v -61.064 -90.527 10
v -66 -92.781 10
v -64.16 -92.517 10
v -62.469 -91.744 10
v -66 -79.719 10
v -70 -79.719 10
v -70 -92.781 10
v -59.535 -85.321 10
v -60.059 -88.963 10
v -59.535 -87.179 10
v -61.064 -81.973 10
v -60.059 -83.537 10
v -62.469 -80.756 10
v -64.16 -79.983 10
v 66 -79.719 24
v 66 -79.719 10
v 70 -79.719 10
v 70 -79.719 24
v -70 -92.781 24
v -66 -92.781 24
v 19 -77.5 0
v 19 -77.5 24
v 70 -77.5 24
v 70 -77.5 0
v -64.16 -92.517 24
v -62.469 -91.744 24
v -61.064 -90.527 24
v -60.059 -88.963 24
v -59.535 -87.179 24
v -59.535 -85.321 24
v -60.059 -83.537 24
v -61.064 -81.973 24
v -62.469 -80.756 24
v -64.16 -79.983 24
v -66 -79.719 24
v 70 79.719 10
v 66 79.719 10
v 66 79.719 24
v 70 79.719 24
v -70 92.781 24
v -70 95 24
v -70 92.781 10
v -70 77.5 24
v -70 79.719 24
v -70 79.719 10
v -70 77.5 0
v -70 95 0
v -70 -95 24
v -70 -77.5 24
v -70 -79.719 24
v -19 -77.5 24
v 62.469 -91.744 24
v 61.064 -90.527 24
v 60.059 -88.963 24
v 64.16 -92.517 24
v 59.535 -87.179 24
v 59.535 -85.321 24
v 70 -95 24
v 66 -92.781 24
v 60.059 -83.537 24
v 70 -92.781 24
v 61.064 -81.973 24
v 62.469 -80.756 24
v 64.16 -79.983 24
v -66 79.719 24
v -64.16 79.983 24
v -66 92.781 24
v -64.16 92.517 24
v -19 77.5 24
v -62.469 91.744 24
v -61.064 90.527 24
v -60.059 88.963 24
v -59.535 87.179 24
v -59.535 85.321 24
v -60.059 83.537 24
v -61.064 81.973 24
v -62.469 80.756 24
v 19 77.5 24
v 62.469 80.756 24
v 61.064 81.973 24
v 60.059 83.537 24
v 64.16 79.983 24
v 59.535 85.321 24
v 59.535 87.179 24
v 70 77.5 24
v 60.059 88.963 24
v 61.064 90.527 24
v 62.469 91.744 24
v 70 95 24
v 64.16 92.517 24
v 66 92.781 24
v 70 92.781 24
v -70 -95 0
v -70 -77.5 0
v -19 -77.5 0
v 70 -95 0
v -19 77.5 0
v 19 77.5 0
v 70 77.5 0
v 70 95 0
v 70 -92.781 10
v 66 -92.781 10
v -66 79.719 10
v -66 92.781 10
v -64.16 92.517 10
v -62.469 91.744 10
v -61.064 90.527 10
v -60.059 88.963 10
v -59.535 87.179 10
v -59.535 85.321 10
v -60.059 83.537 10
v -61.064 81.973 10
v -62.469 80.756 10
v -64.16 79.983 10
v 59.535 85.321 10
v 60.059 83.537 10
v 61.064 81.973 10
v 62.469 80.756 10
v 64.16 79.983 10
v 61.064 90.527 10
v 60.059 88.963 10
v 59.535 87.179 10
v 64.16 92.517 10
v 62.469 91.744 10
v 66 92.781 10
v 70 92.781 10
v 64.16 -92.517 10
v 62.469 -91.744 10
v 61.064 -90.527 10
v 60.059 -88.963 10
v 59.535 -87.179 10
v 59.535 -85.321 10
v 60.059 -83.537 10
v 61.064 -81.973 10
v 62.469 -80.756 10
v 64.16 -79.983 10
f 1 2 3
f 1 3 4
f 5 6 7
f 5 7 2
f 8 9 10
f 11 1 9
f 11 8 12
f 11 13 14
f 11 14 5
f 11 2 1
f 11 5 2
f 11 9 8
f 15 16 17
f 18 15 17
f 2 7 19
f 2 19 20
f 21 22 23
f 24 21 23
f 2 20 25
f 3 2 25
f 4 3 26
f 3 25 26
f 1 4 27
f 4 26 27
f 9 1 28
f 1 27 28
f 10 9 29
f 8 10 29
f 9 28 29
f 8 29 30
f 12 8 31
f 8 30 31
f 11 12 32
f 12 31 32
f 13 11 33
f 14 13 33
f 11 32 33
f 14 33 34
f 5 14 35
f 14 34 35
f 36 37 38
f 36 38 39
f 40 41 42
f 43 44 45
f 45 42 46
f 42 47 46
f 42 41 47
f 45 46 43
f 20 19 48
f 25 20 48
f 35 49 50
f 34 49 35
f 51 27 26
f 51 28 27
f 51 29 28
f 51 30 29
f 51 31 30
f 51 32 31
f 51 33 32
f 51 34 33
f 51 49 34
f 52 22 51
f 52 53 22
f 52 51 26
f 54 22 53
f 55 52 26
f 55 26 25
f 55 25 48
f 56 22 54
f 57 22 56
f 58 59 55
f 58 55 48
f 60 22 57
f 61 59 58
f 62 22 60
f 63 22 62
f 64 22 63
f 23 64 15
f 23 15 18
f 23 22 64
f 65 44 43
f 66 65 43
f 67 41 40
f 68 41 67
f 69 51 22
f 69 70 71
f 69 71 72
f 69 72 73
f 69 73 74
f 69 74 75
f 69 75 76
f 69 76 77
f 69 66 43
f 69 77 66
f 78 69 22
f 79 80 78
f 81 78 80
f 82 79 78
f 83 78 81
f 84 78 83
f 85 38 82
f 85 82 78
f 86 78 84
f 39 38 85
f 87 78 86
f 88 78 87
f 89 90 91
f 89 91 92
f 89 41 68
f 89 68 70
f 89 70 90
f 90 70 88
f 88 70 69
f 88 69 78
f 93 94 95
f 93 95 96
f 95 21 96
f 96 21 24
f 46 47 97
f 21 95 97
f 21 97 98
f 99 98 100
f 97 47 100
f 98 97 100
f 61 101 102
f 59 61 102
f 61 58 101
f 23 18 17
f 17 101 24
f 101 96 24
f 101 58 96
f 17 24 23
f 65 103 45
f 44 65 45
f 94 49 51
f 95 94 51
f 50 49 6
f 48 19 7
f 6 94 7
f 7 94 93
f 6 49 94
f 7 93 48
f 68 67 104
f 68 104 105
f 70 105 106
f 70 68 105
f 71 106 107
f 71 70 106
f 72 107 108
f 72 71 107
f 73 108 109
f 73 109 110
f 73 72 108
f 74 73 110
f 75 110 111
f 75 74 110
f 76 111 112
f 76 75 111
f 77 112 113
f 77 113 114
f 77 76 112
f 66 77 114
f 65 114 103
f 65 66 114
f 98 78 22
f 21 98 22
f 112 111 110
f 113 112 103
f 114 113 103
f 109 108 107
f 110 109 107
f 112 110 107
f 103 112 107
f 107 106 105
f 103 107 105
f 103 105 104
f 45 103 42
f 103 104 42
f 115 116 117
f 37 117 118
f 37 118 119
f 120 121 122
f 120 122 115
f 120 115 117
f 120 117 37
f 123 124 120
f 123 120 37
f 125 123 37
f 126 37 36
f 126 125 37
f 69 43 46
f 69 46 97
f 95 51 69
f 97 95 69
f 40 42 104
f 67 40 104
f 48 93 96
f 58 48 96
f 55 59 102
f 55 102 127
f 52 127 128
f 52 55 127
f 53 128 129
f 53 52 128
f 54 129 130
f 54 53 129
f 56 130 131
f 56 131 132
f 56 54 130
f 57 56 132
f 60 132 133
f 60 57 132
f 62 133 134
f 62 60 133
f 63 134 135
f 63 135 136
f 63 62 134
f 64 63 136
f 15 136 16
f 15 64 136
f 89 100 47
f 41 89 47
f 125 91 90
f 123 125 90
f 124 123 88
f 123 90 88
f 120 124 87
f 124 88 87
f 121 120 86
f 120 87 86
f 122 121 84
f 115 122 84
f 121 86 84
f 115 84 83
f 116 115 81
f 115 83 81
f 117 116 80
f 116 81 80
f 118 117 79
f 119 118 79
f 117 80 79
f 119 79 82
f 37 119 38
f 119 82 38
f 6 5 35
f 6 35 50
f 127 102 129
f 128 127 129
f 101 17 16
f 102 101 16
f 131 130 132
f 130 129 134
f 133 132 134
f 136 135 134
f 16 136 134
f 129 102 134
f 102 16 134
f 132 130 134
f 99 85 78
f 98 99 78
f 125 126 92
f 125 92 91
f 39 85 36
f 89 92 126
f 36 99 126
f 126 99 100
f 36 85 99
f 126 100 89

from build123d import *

# Parameters (mm, degrees)
SKETCH1_W           = 35
SKETCH1_H           = 155
SKETCH1_H_2         = 17.5
BOSS_EXTRUDE1_DEPTH = 24
SKETCH2_W           = 51
SKETCH2_H           = 77.5
CUT_EXTRUDE1_DEPTH  = 24
CUT_EXTRUDE2_DEPTH  = 14


with BuildPart() as part:
    # Sketch1 → Boss-Extrude1 (new body)
    with BuildSketch(Plane.XY):
        with Locations((-52.5, 0)):
            Rectangle(SKETCH1_W, SKETCH1_H)
        with Locations((-52.5, 86.25)):
            Rectangle(SKETCH1_W, SKETCH1_H_2)
        Polygon((35, 95), (-35, 95), (-35, 77.5), (-35, -77.5), (-35, -95), (35, -95), (35, -77.5), (35, 77.5), align=None)
        with Locations((52.5, 86.25)):
            Rectangle(SKETCH1_W, SKETCH1_H_2)
        with Locations((52.5, 0)):
            Rectangle(SKETCH1_W, SKETCH1_H)
        with Locations((52.5, -86.25)):
            Rectangle(SKETCH1_W, SKETCH1_H_2)
        with Locations((-52.5, -86.25)):
            Rectangle(SKETCH1_W, SKETCH1_H_2)
    extrude(amount=BOSS_EXTRUDE1_DEPTH)

    # Sketch2 → Cut-Extrude1 (cut)
    with BuildSketch(Plane.XY.offset(24)):
        with Locations((-44.5, 38.75)):
            Rectangle(SKETCH2_W, SKETCH2_H)
        with Locations((-44.5, -38.75)):
            Rectangle(SKETCH2_W, SKETCH2_H)
        Polygon((35, 77.5), (19, 77.5), (19, 0), (70, 0), (70, 77.5), align=None)
        Polygon((70, 0), (19, 0), (19, -77.5), (35, -77.5), (70, -77.5), align=None)
    extrude(amount=-CUT_EXTRUDE1_DEPTH, mode=Mode.SUBTRACT)

    # Sketch3 → Cut-Extrude2 (cut)
    with BuildSketch(Plane.XY.offset(24)):
        with BuildLine():
            Line((70, -92.781156562), (66, -92.781156562))
            ThreePointArc((66, -92.781156562), (59.468843438, -86.25), (66, -79.718843438))
            Line((66, -79.718843438), (70, -79.718843438))
            ThreePointArc((70, -79.718843438), (76.531156562, -86.25), (70, -92.781156562))
        make_face()
        with BuildLine():
            Line((70, 92.781156562), (66, 92.781156562))
            ThreePointArc((66, 92.781156562), (59.468843438, 86.25), (66, 79.718843438))
            Line((66, 79.718843438), (70, 79.718843438))
            ThreePointArc((70, 79.718843438), (76.531156562, 86.25), (70, 92.781156562))
        make_face()
        with BuildLine():
            Line((-70, 92.781156562), (-66, 92.781156562))
            ThreePointArc((-66, 92.781156562), (-59.468843438, 86.25), (-66, 79.718843438))
            Line((-66, 79.718843438), (-70, 79.718843438))
            ThreePointArc((-70, 79.718843438), (-76.531156562, 86.25), (-70, 92.781156562))
        make_face()
        with BuildLine():
            Line((-70, -92.781156562), (-66, -92.781156562))
            ThreePointArc((-66, -92.781156562), (-59.468843438, -86.25), (-66, -79.718843438))
            Line((-66, -79.718843438), (-70, -79.718843438))
            ThreePointArc((-70, -79.718843438), (-76.531156562, -86.25), (-70, -92.781156562))
        make_face()
    extrude(amount=-CUT_EXTRUDE2_DEPTH, mode=Mode.SUBTRACT)


solid = part.part
